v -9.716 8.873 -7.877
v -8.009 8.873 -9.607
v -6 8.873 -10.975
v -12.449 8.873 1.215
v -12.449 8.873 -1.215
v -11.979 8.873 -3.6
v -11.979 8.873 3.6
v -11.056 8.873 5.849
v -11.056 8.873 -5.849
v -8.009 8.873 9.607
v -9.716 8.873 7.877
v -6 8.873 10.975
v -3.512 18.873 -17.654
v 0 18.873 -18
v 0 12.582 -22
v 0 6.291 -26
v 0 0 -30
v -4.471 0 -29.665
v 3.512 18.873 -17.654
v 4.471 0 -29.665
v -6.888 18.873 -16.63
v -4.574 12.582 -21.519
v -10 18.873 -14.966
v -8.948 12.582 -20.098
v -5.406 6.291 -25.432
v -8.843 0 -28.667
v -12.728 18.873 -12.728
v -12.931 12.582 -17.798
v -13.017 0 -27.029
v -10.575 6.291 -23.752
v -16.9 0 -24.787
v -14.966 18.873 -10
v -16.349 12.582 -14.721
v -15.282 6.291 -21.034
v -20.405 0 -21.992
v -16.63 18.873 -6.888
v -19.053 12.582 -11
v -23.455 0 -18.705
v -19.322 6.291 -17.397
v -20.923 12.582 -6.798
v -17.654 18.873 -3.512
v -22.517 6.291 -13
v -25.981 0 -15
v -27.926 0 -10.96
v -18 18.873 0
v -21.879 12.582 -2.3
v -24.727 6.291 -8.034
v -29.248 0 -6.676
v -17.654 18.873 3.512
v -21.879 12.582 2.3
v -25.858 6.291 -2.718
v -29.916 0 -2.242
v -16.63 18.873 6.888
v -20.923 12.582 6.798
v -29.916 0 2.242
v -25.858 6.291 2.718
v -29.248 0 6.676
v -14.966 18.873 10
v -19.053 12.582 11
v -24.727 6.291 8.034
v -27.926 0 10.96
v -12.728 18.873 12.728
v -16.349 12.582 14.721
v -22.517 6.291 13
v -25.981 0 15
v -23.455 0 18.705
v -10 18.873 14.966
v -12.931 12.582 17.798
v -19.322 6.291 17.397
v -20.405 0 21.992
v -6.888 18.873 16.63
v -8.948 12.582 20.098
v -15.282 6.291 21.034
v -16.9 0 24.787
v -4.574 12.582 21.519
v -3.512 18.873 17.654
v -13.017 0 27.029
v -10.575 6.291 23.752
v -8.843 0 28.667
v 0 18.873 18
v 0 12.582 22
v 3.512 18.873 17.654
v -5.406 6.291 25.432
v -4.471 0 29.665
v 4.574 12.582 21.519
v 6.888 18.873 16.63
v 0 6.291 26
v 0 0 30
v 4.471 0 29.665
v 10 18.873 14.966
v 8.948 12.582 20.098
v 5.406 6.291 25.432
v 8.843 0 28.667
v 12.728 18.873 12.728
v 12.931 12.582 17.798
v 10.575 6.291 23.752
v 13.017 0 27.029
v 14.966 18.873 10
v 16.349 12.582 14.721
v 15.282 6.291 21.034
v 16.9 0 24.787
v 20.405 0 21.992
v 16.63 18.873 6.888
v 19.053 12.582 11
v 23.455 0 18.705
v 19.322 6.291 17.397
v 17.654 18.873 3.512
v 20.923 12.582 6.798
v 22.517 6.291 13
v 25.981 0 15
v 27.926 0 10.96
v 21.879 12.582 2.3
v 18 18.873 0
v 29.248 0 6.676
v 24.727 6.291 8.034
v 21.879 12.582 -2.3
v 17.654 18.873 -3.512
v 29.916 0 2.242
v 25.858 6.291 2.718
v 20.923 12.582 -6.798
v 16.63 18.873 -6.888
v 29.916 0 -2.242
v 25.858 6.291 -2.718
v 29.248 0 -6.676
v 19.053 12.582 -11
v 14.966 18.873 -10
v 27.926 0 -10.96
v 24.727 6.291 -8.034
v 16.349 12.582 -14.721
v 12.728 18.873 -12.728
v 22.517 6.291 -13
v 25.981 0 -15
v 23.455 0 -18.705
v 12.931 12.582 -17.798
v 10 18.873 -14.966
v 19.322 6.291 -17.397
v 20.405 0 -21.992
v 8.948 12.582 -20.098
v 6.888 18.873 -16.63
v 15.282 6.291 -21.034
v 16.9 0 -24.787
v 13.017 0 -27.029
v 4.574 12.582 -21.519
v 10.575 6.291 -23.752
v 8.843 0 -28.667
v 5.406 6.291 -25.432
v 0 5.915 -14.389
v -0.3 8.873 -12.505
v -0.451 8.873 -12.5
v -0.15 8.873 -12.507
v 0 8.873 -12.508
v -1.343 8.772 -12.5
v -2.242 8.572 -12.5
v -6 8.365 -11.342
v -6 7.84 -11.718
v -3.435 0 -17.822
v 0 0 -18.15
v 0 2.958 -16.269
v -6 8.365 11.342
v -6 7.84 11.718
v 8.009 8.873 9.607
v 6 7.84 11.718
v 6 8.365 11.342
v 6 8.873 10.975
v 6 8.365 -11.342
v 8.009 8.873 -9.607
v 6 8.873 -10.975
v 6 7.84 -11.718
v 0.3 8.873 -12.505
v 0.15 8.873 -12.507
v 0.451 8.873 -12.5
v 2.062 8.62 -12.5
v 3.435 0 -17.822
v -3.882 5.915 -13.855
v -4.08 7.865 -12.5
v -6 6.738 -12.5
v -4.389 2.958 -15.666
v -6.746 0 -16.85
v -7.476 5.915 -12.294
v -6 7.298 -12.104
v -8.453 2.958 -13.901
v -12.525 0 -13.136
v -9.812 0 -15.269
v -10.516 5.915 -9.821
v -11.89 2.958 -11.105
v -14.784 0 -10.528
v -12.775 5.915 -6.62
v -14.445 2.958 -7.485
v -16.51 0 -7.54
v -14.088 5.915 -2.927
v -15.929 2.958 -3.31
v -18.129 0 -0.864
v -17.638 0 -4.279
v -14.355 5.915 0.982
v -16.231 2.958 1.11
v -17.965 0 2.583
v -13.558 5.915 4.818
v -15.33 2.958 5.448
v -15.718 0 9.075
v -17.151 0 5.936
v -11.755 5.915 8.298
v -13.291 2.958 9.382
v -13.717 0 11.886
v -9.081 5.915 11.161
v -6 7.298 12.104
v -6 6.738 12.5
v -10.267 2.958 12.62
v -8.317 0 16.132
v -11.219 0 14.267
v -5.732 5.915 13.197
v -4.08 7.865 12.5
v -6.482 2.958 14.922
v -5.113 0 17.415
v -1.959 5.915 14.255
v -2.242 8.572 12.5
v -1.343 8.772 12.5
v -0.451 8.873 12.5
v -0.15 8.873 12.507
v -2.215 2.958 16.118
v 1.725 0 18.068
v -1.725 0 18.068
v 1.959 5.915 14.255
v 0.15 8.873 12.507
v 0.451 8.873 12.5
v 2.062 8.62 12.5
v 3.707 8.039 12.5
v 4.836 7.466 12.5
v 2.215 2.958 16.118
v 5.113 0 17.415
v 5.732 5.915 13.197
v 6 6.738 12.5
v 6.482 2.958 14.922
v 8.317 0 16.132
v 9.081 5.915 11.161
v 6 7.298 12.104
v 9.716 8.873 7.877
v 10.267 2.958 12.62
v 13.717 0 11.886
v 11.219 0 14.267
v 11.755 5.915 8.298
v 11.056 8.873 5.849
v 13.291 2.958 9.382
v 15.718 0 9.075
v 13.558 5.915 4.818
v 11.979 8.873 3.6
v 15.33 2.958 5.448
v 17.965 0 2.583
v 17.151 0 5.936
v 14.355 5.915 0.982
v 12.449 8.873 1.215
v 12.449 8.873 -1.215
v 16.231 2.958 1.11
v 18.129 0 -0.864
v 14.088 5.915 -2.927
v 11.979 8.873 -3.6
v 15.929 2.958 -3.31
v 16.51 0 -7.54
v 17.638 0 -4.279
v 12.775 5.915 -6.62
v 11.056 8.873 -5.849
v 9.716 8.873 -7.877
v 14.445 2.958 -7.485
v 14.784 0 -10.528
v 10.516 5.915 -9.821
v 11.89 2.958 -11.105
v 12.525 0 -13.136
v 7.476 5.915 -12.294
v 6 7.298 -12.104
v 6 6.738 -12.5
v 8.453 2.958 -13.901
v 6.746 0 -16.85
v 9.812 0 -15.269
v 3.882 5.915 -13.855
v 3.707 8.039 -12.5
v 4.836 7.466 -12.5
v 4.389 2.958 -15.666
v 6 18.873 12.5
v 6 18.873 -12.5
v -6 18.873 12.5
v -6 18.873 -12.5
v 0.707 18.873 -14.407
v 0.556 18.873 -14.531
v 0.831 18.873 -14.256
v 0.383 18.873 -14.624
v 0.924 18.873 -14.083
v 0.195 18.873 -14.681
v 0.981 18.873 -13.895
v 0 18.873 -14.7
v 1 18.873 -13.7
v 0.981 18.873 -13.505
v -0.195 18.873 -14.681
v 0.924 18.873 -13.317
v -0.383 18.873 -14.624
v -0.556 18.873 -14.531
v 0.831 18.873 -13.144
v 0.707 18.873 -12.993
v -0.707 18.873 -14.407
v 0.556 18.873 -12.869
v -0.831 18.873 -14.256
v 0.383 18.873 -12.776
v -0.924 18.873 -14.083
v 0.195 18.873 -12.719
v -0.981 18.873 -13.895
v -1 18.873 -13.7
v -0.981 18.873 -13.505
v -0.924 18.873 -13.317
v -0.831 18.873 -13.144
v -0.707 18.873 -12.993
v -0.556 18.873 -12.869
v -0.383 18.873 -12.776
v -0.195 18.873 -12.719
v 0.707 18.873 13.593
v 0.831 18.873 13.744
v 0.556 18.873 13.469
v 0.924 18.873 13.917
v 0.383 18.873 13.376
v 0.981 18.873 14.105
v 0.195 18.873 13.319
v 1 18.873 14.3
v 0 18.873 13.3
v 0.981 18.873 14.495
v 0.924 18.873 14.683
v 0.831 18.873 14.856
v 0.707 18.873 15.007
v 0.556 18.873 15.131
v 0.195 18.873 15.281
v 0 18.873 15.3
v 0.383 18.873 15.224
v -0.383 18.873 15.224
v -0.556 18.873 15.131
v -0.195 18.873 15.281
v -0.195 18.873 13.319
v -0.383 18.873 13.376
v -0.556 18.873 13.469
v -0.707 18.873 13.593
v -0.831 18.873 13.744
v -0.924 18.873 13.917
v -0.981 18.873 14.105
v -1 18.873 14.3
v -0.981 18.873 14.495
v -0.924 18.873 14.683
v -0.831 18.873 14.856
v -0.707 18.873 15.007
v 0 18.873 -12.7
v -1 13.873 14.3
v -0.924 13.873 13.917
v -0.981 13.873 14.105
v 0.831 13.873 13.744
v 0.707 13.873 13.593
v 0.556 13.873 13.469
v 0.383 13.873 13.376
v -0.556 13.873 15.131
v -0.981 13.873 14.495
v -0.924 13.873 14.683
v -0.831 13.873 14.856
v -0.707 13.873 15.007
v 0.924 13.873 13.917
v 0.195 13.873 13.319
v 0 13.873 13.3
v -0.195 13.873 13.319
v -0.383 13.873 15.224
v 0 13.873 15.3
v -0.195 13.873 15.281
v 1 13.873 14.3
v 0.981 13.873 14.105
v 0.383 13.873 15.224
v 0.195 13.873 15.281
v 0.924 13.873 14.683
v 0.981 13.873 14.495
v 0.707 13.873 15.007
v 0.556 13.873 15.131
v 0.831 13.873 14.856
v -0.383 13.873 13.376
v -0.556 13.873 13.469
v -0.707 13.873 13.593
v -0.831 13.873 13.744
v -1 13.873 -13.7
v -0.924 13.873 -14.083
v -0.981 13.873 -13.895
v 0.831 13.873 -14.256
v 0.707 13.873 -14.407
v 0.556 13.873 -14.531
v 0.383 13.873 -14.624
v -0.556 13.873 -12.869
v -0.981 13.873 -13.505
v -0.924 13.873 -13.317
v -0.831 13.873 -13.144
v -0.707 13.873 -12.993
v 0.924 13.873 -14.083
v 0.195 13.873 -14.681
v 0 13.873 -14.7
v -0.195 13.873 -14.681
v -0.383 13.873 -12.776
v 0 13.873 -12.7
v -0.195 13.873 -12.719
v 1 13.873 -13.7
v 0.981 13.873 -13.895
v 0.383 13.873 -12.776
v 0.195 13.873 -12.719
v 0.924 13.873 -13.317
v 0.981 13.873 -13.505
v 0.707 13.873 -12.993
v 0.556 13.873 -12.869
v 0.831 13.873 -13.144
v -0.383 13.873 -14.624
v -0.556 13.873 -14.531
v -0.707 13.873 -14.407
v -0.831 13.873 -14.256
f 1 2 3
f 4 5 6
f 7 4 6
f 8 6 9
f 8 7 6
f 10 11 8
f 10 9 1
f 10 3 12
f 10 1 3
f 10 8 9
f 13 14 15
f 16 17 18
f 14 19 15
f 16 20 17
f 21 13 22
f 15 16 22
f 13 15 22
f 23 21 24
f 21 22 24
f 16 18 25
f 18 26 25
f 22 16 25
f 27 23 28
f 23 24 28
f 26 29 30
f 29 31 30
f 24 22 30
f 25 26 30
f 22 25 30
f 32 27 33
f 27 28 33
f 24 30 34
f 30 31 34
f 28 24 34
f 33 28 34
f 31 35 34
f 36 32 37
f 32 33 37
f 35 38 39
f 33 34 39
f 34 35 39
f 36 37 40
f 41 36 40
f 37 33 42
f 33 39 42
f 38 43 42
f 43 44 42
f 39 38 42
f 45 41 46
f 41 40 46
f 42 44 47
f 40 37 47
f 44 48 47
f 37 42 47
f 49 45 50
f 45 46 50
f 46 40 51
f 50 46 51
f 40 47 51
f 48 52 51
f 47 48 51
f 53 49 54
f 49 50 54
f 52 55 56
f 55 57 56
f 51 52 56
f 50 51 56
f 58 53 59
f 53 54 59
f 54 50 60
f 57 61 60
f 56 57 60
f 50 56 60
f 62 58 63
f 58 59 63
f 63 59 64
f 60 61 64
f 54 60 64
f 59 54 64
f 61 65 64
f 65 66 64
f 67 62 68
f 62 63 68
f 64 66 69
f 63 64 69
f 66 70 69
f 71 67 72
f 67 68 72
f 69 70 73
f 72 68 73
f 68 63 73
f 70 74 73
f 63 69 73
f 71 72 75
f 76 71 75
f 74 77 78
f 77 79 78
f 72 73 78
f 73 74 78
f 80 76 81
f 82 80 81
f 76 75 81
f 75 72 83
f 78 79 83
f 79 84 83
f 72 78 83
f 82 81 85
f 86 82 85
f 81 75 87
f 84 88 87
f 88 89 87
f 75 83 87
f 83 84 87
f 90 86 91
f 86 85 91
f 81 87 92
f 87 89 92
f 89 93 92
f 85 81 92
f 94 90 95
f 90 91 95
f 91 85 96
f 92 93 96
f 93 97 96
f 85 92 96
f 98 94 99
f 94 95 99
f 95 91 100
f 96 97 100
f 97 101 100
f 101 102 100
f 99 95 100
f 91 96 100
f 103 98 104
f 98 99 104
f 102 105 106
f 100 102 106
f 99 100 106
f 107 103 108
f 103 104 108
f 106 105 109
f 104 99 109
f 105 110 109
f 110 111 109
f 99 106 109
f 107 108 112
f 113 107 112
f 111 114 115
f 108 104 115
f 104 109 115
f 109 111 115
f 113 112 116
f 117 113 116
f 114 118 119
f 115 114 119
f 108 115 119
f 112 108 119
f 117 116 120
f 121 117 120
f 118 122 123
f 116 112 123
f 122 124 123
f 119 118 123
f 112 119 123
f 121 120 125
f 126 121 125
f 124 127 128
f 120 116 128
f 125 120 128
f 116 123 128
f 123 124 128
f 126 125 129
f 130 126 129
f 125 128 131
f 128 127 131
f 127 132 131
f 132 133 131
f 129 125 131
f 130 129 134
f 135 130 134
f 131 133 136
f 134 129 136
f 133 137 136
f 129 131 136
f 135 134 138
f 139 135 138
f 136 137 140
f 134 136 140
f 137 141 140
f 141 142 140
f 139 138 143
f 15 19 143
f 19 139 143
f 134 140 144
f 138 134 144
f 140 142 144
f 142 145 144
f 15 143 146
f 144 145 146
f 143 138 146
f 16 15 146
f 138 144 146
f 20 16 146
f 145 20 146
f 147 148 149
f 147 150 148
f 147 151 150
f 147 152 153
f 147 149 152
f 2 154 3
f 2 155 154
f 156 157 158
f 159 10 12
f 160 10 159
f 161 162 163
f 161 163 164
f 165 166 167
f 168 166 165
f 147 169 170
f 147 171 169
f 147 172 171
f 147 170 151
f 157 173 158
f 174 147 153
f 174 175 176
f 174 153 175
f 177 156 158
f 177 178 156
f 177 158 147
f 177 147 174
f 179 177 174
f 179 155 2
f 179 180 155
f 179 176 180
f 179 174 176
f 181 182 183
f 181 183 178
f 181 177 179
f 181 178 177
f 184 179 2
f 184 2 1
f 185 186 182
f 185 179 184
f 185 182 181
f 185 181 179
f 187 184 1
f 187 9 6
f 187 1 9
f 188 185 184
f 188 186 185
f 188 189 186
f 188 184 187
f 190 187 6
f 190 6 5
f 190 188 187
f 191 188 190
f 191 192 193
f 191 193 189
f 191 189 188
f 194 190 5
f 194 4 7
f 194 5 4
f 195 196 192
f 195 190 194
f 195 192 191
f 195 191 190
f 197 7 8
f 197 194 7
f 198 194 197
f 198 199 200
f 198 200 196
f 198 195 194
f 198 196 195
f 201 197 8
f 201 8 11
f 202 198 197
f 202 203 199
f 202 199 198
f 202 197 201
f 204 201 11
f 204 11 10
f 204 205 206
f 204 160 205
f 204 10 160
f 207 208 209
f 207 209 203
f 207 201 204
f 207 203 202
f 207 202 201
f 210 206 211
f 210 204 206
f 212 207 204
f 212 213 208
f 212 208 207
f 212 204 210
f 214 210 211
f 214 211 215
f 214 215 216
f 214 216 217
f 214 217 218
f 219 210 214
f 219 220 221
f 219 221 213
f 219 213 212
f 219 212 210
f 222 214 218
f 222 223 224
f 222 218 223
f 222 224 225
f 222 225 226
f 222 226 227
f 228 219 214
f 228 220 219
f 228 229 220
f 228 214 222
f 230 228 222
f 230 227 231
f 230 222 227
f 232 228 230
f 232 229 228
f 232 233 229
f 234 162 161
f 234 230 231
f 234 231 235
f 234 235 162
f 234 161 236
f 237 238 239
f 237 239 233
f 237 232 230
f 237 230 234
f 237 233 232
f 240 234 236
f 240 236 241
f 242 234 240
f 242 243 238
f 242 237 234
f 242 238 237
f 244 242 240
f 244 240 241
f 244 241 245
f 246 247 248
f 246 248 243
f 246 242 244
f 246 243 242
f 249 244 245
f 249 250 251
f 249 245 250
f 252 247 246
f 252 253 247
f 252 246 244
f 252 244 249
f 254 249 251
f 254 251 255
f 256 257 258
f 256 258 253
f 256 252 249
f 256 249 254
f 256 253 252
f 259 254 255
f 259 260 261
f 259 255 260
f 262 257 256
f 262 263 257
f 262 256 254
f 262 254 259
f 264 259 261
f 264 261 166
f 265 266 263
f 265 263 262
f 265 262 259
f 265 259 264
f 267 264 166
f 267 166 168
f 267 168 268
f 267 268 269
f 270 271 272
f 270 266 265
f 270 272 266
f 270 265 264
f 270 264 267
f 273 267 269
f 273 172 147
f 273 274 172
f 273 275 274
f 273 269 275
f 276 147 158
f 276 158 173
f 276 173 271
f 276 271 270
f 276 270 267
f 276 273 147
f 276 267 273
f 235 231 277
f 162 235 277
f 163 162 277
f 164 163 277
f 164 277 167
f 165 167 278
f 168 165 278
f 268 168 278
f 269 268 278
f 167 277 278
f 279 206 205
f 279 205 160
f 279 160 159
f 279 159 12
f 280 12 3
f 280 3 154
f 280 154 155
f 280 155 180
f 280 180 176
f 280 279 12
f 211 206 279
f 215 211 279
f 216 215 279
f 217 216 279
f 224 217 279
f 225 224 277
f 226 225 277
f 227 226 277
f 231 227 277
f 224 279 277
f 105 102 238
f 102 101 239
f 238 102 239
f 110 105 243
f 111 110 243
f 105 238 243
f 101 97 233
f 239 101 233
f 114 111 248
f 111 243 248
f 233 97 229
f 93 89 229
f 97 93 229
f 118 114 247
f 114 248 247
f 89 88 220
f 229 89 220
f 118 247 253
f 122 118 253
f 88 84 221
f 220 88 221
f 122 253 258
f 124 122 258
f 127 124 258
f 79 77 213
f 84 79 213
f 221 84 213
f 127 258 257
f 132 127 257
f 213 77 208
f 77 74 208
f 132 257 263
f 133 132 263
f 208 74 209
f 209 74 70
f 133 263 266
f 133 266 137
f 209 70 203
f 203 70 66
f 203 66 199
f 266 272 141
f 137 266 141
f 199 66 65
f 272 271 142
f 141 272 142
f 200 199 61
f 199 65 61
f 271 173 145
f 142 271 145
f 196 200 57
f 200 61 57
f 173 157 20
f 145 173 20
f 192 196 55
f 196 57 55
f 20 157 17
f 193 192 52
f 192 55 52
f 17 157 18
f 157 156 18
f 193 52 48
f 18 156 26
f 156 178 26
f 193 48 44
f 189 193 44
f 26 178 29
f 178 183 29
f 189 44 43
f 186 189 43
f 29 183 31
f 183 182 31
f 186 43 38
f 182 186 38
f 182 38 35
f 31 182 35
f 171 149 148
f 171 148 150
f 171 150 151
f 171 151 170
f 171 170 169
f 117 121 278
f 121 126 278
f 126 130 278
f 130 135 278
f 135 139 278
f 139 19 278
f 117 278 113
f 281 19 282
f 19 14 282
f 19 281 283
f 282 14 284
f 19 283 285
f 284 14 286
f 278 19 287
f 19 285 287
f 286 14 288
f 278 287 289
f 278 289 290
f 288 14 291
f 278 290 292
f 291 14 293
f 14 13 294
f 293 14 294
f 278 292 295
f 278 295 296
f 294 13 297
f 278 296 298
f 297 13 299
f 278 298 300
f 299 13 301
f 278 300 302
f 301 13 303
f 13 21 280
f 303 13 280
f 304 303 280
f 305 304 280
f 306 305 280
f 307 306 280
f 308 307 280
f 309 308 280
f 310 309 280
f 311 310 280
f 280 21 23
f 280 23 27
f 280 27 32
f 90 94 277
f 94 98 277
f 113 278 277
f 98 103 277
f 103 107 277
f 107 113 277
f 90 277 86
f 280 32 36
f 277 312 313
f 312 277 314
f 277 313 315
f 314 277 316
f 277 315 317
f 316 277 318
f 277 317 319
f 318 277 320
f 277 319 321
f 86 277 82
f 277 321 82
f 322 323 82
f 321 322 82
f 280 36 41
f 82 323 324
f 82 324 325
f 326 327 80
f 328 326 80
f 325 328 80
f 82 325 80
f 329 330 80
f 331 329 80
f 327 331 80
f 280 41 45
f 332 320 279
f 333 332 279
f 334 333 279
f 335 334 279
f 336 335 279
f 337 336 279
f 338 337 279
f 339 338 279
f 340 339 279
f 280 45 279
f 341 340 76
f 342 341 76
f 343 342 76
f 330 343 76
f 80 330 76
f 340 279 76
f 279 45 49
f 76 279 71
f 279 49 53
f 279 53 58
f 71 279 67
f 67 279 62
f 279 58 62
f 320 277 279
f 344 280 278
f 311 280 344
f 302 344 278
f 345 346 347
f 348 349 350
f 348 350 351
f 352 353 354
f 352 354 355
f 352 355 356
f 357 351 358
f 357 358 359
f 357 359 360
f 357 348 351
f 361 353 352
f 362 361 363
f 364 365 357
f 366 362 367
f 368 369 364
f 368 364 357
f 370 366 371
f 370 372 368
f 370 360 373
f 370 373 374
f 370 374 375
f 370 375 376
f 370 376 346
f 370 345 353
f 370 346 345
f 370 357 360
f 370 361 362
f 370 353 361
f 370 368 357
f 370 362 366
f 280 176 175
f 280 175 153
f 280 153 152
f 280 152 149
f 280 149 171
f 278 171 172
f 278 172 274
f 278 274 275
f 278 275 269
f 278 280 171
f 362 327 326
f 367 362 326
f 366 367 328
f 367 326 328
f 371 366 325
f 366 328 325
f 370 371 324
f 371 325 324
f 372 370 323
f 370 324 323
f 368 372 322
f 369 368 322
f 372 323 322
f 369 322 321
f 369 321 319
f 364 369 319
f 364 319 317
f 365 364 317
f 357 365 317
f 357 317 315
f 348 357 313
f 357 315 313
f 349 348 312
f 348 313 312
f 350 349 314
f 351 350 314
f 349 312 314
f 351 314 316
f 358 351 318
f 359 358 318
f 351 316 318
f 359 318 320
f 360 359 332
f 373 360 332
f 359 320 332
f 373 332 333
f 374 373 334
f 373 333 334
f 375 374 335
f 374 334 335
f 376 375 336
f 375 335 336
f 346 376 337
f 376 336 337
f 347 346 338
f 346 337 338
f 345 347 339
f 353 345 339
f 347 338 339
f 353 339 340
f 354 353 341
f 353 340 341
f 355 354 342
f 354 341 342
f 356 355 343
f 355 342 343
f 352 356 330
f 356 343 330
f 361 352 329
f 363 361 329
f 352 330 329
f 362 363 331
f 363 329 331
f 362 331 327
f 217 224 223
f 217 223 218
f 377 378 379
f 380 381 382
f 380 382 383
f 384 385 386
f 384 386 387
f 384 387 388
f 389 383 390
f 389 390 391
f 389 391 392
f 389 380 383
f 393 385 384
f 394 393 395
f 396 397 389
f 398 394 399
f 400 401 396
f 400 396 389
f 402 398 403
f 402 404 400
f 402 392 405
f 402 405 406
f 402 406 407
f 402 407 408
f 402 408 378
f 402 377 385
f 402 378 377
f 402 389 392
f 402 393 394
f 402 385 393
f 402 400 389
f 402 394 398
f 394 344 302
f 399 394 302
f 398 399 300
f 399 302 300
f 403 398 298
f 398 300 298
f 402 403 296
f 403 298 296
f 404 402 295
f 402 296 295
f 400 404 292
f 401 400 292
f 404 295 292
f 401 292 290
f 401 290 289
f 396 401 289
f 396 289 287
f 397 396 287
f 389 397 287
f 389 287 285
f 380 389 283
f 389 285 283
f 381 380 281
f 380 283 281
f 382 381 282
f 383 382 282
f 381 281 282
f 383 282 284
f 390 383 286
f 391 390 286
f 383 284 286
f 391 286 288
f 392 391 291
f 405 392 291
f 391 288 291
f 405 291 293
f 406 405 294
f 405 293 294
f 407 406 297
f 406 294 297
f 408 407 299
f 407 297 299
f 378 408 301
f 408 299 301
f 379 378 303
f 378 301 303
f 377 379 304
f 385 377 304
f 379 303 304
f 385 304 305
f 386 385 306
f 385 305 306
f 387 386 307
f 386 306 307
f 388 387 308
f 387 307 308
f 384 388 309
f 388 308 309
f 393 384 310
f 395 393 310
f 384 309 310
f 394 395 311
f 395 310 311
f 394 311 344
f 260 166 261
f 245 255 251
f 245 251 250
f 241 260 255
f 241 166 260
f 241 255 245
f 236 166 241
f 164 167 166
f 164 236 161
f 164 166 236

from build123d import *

# Parameters (mm, degrees)
SHELL2_T           = -10
SKETCH6_W          = 12
SKETCH6_H          = 25
CUT_EXTRUDE2_DEPTH = 47.434654221
SKETCH7_R          = 1
CUT_EXTRUDE3_DEPTH = 5


with BuildPart() as part:
    # Sketch5 → Revolve3 (revolve)
    with BuildSketch(Plane.XY, mode=Mode.PRIVATE) as revolve3_sk:
        Polygon((0, 0), (0, 18.872655155), (-18, 18.872655155), (-30, 0), align=None)
    revolve(revolve3_sk.sketch.rotate(Axis((0, 0, 0), (0, 1, 0)), 270), axis=Axis((0, 0, 0), (0, 1, 0)))

    # Shell2
    shell2_openings = [part.faces().sort_by_distance(p)[0] for p in [
        (0, 0, 0),
    ]]
    offset(amount=SHELL2_T, openings=shell2_openings, kind=Kind.INTERSECTION)

    # Sketch6 → Cut-Extrude2 (cut, through all)
    with BuildSketch(Plane(origin=(0, 18.872655155, 0), x_dir=(1, 0, 0), z_dir=(0, 1, 0))):
        Rectangle(SKETCH6_W, SKETCH6_H)
    extrude(amount=-CUT_EXTRUDE2_DEPTH, mode=Mode.SUBTRACT)

    # Sketch7 → Cut-Extrude3 (cut)
    with BuildSketch(Plane(origin=(0, 18.872655155, 0), x_dir=(1, 0, 0), z_dir=(0, 1, 0))):
        with Locations(Location((0, 13.7, 0), (0, 0, 270))):
            Circle(SKETCH7_R)
        with Locations(Location((0, -14.3, 0), (0, 0, 270))):
            Circle(SKETCH7_R)
    extrude(amount=-CUT_EXTRUDE3_DEPTH, mode=Mode.SUBTRACT)


solid = part.part
